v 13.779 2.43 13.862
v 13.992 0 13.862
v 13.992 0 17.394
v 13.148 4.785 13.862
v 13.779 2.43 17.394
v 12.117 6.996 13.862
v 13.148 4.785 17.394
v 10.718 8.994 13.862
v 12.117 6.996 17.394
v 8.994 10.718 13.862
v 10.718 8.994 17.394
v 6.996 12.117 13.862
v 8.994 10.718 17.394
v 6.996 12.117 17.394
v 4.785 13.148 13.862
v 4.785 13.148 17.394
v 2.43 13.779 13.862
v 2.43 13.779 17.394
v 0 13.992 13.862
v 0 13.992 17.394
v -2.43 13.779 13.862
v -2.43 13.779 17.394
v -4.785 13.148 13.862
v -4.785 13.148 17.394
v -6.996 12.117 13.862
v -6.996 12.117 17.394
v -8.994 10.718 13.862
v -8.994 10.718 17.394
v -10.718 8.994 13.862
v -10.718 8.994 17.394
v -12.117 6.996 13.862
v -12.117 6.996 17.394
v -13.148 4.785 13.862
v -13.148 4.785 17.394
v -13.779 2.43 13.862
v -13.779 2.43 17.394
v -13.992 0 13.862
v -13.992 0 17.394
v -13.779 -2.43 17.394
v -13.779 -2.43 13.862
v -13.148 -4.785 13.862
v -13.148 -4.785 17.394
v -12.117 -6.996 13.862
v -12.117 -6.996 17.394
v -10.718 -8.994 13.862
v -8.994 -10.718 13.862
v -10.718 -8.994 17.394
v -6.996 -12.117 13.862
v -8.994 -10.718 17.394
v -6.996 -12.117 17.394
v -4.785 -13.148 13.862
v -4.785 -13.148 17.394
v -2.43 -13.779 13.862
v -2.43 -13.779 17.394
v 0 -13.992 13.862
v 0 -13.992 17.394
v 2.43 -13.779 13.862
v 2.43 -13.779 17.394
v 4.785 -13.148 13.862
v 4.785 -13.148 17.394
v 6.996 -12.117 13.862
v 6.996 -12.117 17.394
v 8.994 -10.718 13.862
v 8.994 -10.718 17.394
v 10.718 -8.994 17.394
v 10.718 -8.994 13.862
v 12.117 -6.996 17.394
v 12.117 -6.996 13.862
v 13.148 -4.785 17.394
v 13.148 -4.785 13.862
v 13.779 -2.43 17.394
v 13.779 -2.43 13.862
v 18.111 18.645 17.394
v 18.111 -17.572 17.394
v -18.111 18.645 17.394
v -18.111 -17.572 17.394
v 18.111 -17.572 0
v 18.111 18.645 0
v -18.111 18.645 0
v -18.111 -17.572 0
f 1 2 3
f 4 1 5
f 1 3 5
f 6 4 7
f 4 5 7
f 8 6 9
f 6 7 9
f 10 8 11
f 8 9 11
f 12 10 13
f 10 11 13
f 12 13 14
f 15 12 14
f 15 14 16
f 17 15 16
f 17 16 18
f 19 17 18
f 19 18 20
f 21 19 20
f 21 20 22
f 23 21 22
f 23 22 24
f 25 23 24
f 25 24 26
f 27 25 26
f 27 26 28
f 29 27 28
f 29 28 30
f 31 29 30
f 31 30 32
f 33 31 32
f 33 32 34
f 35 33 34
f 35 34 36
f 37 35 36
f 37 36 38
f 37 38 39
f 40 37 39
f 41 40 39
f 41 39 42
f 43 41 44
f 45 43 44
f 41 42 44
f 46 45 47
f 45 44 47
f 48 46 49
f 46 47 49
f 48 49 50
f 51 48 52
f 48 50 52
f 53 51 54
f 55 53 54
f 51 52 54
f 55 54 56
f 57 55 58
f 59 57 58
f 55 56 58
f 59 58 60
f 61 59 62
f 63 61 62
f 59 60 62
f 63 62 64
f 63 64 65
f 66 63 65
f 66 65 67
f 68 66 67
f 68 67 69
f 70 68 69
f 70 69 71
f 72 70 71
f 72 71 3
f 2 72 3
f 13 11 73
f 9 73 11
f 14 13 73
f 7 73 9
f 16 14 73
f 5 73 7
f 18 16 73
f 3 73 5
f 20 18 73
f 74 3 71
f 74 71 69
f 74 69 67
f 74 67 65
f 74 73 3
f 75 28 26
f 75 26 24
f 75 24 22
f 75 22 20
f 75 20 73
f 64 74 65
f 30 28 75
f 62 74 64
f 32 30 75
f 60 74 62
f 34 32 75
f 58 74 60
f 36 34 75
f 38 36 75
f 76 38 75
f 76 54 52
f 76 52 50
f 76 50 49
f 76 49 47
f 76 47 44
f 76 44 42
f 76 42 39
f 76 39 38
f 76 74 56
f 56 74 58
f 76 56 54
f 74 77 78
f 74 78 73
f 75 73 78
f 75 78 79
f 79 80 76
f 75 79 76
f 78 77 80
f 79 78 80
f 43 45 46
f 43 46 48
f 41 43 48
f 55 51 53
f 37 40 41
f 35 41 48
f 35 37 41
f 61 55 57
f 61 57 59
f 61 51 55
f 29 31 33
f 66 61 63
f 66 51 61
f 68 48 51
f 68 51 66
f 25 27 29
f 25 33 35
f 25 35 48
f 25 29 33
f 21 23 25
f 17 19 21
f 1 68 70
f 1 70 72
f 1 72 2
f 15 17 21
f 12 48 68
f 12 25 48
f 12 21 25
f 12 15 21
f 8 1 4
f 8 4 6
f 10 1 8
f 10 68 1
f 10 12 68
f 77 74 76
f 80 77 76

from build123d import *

# Parameters (mm, degrees)
F1_R     = 13.9916710172
F2_DEPTH = 25.4
F4_W     = 36.2210944295
F4_H     = 17.3936840147
F5_DEPTH = 36.2169072032
F6_DEPTH = 11.5376953036


with BuildPart() as f2:
    # F1 (on face) → F2 (new body)
    with BuildSketch(Plane.XY):
        Circle(F1_R)
    extrude(amount=F2_DEPTH)

    # F4 (on face) → F5 (join)
    with BuildSketch(Plane(origin=(0, -17.5722502172, 0), x_dir=(-1, 0, 0), z_dir=(0, 1, 0))):
        with Locations((0, 8.6968420073)):
            Rectangle(F4_W, F4_H)
    extrude(amount=F5_DEPTH)

    # F6 (cut): a face of the model
    f6_faces = [f2.faces().sort_by_distance(p)[0] for p in [
        (0, 0, 25.4),
    ]]
    extrude(f6_faces, amount=-F6_DEPTH, mode=Mode.SUBTRACT)


solid = f2.part
